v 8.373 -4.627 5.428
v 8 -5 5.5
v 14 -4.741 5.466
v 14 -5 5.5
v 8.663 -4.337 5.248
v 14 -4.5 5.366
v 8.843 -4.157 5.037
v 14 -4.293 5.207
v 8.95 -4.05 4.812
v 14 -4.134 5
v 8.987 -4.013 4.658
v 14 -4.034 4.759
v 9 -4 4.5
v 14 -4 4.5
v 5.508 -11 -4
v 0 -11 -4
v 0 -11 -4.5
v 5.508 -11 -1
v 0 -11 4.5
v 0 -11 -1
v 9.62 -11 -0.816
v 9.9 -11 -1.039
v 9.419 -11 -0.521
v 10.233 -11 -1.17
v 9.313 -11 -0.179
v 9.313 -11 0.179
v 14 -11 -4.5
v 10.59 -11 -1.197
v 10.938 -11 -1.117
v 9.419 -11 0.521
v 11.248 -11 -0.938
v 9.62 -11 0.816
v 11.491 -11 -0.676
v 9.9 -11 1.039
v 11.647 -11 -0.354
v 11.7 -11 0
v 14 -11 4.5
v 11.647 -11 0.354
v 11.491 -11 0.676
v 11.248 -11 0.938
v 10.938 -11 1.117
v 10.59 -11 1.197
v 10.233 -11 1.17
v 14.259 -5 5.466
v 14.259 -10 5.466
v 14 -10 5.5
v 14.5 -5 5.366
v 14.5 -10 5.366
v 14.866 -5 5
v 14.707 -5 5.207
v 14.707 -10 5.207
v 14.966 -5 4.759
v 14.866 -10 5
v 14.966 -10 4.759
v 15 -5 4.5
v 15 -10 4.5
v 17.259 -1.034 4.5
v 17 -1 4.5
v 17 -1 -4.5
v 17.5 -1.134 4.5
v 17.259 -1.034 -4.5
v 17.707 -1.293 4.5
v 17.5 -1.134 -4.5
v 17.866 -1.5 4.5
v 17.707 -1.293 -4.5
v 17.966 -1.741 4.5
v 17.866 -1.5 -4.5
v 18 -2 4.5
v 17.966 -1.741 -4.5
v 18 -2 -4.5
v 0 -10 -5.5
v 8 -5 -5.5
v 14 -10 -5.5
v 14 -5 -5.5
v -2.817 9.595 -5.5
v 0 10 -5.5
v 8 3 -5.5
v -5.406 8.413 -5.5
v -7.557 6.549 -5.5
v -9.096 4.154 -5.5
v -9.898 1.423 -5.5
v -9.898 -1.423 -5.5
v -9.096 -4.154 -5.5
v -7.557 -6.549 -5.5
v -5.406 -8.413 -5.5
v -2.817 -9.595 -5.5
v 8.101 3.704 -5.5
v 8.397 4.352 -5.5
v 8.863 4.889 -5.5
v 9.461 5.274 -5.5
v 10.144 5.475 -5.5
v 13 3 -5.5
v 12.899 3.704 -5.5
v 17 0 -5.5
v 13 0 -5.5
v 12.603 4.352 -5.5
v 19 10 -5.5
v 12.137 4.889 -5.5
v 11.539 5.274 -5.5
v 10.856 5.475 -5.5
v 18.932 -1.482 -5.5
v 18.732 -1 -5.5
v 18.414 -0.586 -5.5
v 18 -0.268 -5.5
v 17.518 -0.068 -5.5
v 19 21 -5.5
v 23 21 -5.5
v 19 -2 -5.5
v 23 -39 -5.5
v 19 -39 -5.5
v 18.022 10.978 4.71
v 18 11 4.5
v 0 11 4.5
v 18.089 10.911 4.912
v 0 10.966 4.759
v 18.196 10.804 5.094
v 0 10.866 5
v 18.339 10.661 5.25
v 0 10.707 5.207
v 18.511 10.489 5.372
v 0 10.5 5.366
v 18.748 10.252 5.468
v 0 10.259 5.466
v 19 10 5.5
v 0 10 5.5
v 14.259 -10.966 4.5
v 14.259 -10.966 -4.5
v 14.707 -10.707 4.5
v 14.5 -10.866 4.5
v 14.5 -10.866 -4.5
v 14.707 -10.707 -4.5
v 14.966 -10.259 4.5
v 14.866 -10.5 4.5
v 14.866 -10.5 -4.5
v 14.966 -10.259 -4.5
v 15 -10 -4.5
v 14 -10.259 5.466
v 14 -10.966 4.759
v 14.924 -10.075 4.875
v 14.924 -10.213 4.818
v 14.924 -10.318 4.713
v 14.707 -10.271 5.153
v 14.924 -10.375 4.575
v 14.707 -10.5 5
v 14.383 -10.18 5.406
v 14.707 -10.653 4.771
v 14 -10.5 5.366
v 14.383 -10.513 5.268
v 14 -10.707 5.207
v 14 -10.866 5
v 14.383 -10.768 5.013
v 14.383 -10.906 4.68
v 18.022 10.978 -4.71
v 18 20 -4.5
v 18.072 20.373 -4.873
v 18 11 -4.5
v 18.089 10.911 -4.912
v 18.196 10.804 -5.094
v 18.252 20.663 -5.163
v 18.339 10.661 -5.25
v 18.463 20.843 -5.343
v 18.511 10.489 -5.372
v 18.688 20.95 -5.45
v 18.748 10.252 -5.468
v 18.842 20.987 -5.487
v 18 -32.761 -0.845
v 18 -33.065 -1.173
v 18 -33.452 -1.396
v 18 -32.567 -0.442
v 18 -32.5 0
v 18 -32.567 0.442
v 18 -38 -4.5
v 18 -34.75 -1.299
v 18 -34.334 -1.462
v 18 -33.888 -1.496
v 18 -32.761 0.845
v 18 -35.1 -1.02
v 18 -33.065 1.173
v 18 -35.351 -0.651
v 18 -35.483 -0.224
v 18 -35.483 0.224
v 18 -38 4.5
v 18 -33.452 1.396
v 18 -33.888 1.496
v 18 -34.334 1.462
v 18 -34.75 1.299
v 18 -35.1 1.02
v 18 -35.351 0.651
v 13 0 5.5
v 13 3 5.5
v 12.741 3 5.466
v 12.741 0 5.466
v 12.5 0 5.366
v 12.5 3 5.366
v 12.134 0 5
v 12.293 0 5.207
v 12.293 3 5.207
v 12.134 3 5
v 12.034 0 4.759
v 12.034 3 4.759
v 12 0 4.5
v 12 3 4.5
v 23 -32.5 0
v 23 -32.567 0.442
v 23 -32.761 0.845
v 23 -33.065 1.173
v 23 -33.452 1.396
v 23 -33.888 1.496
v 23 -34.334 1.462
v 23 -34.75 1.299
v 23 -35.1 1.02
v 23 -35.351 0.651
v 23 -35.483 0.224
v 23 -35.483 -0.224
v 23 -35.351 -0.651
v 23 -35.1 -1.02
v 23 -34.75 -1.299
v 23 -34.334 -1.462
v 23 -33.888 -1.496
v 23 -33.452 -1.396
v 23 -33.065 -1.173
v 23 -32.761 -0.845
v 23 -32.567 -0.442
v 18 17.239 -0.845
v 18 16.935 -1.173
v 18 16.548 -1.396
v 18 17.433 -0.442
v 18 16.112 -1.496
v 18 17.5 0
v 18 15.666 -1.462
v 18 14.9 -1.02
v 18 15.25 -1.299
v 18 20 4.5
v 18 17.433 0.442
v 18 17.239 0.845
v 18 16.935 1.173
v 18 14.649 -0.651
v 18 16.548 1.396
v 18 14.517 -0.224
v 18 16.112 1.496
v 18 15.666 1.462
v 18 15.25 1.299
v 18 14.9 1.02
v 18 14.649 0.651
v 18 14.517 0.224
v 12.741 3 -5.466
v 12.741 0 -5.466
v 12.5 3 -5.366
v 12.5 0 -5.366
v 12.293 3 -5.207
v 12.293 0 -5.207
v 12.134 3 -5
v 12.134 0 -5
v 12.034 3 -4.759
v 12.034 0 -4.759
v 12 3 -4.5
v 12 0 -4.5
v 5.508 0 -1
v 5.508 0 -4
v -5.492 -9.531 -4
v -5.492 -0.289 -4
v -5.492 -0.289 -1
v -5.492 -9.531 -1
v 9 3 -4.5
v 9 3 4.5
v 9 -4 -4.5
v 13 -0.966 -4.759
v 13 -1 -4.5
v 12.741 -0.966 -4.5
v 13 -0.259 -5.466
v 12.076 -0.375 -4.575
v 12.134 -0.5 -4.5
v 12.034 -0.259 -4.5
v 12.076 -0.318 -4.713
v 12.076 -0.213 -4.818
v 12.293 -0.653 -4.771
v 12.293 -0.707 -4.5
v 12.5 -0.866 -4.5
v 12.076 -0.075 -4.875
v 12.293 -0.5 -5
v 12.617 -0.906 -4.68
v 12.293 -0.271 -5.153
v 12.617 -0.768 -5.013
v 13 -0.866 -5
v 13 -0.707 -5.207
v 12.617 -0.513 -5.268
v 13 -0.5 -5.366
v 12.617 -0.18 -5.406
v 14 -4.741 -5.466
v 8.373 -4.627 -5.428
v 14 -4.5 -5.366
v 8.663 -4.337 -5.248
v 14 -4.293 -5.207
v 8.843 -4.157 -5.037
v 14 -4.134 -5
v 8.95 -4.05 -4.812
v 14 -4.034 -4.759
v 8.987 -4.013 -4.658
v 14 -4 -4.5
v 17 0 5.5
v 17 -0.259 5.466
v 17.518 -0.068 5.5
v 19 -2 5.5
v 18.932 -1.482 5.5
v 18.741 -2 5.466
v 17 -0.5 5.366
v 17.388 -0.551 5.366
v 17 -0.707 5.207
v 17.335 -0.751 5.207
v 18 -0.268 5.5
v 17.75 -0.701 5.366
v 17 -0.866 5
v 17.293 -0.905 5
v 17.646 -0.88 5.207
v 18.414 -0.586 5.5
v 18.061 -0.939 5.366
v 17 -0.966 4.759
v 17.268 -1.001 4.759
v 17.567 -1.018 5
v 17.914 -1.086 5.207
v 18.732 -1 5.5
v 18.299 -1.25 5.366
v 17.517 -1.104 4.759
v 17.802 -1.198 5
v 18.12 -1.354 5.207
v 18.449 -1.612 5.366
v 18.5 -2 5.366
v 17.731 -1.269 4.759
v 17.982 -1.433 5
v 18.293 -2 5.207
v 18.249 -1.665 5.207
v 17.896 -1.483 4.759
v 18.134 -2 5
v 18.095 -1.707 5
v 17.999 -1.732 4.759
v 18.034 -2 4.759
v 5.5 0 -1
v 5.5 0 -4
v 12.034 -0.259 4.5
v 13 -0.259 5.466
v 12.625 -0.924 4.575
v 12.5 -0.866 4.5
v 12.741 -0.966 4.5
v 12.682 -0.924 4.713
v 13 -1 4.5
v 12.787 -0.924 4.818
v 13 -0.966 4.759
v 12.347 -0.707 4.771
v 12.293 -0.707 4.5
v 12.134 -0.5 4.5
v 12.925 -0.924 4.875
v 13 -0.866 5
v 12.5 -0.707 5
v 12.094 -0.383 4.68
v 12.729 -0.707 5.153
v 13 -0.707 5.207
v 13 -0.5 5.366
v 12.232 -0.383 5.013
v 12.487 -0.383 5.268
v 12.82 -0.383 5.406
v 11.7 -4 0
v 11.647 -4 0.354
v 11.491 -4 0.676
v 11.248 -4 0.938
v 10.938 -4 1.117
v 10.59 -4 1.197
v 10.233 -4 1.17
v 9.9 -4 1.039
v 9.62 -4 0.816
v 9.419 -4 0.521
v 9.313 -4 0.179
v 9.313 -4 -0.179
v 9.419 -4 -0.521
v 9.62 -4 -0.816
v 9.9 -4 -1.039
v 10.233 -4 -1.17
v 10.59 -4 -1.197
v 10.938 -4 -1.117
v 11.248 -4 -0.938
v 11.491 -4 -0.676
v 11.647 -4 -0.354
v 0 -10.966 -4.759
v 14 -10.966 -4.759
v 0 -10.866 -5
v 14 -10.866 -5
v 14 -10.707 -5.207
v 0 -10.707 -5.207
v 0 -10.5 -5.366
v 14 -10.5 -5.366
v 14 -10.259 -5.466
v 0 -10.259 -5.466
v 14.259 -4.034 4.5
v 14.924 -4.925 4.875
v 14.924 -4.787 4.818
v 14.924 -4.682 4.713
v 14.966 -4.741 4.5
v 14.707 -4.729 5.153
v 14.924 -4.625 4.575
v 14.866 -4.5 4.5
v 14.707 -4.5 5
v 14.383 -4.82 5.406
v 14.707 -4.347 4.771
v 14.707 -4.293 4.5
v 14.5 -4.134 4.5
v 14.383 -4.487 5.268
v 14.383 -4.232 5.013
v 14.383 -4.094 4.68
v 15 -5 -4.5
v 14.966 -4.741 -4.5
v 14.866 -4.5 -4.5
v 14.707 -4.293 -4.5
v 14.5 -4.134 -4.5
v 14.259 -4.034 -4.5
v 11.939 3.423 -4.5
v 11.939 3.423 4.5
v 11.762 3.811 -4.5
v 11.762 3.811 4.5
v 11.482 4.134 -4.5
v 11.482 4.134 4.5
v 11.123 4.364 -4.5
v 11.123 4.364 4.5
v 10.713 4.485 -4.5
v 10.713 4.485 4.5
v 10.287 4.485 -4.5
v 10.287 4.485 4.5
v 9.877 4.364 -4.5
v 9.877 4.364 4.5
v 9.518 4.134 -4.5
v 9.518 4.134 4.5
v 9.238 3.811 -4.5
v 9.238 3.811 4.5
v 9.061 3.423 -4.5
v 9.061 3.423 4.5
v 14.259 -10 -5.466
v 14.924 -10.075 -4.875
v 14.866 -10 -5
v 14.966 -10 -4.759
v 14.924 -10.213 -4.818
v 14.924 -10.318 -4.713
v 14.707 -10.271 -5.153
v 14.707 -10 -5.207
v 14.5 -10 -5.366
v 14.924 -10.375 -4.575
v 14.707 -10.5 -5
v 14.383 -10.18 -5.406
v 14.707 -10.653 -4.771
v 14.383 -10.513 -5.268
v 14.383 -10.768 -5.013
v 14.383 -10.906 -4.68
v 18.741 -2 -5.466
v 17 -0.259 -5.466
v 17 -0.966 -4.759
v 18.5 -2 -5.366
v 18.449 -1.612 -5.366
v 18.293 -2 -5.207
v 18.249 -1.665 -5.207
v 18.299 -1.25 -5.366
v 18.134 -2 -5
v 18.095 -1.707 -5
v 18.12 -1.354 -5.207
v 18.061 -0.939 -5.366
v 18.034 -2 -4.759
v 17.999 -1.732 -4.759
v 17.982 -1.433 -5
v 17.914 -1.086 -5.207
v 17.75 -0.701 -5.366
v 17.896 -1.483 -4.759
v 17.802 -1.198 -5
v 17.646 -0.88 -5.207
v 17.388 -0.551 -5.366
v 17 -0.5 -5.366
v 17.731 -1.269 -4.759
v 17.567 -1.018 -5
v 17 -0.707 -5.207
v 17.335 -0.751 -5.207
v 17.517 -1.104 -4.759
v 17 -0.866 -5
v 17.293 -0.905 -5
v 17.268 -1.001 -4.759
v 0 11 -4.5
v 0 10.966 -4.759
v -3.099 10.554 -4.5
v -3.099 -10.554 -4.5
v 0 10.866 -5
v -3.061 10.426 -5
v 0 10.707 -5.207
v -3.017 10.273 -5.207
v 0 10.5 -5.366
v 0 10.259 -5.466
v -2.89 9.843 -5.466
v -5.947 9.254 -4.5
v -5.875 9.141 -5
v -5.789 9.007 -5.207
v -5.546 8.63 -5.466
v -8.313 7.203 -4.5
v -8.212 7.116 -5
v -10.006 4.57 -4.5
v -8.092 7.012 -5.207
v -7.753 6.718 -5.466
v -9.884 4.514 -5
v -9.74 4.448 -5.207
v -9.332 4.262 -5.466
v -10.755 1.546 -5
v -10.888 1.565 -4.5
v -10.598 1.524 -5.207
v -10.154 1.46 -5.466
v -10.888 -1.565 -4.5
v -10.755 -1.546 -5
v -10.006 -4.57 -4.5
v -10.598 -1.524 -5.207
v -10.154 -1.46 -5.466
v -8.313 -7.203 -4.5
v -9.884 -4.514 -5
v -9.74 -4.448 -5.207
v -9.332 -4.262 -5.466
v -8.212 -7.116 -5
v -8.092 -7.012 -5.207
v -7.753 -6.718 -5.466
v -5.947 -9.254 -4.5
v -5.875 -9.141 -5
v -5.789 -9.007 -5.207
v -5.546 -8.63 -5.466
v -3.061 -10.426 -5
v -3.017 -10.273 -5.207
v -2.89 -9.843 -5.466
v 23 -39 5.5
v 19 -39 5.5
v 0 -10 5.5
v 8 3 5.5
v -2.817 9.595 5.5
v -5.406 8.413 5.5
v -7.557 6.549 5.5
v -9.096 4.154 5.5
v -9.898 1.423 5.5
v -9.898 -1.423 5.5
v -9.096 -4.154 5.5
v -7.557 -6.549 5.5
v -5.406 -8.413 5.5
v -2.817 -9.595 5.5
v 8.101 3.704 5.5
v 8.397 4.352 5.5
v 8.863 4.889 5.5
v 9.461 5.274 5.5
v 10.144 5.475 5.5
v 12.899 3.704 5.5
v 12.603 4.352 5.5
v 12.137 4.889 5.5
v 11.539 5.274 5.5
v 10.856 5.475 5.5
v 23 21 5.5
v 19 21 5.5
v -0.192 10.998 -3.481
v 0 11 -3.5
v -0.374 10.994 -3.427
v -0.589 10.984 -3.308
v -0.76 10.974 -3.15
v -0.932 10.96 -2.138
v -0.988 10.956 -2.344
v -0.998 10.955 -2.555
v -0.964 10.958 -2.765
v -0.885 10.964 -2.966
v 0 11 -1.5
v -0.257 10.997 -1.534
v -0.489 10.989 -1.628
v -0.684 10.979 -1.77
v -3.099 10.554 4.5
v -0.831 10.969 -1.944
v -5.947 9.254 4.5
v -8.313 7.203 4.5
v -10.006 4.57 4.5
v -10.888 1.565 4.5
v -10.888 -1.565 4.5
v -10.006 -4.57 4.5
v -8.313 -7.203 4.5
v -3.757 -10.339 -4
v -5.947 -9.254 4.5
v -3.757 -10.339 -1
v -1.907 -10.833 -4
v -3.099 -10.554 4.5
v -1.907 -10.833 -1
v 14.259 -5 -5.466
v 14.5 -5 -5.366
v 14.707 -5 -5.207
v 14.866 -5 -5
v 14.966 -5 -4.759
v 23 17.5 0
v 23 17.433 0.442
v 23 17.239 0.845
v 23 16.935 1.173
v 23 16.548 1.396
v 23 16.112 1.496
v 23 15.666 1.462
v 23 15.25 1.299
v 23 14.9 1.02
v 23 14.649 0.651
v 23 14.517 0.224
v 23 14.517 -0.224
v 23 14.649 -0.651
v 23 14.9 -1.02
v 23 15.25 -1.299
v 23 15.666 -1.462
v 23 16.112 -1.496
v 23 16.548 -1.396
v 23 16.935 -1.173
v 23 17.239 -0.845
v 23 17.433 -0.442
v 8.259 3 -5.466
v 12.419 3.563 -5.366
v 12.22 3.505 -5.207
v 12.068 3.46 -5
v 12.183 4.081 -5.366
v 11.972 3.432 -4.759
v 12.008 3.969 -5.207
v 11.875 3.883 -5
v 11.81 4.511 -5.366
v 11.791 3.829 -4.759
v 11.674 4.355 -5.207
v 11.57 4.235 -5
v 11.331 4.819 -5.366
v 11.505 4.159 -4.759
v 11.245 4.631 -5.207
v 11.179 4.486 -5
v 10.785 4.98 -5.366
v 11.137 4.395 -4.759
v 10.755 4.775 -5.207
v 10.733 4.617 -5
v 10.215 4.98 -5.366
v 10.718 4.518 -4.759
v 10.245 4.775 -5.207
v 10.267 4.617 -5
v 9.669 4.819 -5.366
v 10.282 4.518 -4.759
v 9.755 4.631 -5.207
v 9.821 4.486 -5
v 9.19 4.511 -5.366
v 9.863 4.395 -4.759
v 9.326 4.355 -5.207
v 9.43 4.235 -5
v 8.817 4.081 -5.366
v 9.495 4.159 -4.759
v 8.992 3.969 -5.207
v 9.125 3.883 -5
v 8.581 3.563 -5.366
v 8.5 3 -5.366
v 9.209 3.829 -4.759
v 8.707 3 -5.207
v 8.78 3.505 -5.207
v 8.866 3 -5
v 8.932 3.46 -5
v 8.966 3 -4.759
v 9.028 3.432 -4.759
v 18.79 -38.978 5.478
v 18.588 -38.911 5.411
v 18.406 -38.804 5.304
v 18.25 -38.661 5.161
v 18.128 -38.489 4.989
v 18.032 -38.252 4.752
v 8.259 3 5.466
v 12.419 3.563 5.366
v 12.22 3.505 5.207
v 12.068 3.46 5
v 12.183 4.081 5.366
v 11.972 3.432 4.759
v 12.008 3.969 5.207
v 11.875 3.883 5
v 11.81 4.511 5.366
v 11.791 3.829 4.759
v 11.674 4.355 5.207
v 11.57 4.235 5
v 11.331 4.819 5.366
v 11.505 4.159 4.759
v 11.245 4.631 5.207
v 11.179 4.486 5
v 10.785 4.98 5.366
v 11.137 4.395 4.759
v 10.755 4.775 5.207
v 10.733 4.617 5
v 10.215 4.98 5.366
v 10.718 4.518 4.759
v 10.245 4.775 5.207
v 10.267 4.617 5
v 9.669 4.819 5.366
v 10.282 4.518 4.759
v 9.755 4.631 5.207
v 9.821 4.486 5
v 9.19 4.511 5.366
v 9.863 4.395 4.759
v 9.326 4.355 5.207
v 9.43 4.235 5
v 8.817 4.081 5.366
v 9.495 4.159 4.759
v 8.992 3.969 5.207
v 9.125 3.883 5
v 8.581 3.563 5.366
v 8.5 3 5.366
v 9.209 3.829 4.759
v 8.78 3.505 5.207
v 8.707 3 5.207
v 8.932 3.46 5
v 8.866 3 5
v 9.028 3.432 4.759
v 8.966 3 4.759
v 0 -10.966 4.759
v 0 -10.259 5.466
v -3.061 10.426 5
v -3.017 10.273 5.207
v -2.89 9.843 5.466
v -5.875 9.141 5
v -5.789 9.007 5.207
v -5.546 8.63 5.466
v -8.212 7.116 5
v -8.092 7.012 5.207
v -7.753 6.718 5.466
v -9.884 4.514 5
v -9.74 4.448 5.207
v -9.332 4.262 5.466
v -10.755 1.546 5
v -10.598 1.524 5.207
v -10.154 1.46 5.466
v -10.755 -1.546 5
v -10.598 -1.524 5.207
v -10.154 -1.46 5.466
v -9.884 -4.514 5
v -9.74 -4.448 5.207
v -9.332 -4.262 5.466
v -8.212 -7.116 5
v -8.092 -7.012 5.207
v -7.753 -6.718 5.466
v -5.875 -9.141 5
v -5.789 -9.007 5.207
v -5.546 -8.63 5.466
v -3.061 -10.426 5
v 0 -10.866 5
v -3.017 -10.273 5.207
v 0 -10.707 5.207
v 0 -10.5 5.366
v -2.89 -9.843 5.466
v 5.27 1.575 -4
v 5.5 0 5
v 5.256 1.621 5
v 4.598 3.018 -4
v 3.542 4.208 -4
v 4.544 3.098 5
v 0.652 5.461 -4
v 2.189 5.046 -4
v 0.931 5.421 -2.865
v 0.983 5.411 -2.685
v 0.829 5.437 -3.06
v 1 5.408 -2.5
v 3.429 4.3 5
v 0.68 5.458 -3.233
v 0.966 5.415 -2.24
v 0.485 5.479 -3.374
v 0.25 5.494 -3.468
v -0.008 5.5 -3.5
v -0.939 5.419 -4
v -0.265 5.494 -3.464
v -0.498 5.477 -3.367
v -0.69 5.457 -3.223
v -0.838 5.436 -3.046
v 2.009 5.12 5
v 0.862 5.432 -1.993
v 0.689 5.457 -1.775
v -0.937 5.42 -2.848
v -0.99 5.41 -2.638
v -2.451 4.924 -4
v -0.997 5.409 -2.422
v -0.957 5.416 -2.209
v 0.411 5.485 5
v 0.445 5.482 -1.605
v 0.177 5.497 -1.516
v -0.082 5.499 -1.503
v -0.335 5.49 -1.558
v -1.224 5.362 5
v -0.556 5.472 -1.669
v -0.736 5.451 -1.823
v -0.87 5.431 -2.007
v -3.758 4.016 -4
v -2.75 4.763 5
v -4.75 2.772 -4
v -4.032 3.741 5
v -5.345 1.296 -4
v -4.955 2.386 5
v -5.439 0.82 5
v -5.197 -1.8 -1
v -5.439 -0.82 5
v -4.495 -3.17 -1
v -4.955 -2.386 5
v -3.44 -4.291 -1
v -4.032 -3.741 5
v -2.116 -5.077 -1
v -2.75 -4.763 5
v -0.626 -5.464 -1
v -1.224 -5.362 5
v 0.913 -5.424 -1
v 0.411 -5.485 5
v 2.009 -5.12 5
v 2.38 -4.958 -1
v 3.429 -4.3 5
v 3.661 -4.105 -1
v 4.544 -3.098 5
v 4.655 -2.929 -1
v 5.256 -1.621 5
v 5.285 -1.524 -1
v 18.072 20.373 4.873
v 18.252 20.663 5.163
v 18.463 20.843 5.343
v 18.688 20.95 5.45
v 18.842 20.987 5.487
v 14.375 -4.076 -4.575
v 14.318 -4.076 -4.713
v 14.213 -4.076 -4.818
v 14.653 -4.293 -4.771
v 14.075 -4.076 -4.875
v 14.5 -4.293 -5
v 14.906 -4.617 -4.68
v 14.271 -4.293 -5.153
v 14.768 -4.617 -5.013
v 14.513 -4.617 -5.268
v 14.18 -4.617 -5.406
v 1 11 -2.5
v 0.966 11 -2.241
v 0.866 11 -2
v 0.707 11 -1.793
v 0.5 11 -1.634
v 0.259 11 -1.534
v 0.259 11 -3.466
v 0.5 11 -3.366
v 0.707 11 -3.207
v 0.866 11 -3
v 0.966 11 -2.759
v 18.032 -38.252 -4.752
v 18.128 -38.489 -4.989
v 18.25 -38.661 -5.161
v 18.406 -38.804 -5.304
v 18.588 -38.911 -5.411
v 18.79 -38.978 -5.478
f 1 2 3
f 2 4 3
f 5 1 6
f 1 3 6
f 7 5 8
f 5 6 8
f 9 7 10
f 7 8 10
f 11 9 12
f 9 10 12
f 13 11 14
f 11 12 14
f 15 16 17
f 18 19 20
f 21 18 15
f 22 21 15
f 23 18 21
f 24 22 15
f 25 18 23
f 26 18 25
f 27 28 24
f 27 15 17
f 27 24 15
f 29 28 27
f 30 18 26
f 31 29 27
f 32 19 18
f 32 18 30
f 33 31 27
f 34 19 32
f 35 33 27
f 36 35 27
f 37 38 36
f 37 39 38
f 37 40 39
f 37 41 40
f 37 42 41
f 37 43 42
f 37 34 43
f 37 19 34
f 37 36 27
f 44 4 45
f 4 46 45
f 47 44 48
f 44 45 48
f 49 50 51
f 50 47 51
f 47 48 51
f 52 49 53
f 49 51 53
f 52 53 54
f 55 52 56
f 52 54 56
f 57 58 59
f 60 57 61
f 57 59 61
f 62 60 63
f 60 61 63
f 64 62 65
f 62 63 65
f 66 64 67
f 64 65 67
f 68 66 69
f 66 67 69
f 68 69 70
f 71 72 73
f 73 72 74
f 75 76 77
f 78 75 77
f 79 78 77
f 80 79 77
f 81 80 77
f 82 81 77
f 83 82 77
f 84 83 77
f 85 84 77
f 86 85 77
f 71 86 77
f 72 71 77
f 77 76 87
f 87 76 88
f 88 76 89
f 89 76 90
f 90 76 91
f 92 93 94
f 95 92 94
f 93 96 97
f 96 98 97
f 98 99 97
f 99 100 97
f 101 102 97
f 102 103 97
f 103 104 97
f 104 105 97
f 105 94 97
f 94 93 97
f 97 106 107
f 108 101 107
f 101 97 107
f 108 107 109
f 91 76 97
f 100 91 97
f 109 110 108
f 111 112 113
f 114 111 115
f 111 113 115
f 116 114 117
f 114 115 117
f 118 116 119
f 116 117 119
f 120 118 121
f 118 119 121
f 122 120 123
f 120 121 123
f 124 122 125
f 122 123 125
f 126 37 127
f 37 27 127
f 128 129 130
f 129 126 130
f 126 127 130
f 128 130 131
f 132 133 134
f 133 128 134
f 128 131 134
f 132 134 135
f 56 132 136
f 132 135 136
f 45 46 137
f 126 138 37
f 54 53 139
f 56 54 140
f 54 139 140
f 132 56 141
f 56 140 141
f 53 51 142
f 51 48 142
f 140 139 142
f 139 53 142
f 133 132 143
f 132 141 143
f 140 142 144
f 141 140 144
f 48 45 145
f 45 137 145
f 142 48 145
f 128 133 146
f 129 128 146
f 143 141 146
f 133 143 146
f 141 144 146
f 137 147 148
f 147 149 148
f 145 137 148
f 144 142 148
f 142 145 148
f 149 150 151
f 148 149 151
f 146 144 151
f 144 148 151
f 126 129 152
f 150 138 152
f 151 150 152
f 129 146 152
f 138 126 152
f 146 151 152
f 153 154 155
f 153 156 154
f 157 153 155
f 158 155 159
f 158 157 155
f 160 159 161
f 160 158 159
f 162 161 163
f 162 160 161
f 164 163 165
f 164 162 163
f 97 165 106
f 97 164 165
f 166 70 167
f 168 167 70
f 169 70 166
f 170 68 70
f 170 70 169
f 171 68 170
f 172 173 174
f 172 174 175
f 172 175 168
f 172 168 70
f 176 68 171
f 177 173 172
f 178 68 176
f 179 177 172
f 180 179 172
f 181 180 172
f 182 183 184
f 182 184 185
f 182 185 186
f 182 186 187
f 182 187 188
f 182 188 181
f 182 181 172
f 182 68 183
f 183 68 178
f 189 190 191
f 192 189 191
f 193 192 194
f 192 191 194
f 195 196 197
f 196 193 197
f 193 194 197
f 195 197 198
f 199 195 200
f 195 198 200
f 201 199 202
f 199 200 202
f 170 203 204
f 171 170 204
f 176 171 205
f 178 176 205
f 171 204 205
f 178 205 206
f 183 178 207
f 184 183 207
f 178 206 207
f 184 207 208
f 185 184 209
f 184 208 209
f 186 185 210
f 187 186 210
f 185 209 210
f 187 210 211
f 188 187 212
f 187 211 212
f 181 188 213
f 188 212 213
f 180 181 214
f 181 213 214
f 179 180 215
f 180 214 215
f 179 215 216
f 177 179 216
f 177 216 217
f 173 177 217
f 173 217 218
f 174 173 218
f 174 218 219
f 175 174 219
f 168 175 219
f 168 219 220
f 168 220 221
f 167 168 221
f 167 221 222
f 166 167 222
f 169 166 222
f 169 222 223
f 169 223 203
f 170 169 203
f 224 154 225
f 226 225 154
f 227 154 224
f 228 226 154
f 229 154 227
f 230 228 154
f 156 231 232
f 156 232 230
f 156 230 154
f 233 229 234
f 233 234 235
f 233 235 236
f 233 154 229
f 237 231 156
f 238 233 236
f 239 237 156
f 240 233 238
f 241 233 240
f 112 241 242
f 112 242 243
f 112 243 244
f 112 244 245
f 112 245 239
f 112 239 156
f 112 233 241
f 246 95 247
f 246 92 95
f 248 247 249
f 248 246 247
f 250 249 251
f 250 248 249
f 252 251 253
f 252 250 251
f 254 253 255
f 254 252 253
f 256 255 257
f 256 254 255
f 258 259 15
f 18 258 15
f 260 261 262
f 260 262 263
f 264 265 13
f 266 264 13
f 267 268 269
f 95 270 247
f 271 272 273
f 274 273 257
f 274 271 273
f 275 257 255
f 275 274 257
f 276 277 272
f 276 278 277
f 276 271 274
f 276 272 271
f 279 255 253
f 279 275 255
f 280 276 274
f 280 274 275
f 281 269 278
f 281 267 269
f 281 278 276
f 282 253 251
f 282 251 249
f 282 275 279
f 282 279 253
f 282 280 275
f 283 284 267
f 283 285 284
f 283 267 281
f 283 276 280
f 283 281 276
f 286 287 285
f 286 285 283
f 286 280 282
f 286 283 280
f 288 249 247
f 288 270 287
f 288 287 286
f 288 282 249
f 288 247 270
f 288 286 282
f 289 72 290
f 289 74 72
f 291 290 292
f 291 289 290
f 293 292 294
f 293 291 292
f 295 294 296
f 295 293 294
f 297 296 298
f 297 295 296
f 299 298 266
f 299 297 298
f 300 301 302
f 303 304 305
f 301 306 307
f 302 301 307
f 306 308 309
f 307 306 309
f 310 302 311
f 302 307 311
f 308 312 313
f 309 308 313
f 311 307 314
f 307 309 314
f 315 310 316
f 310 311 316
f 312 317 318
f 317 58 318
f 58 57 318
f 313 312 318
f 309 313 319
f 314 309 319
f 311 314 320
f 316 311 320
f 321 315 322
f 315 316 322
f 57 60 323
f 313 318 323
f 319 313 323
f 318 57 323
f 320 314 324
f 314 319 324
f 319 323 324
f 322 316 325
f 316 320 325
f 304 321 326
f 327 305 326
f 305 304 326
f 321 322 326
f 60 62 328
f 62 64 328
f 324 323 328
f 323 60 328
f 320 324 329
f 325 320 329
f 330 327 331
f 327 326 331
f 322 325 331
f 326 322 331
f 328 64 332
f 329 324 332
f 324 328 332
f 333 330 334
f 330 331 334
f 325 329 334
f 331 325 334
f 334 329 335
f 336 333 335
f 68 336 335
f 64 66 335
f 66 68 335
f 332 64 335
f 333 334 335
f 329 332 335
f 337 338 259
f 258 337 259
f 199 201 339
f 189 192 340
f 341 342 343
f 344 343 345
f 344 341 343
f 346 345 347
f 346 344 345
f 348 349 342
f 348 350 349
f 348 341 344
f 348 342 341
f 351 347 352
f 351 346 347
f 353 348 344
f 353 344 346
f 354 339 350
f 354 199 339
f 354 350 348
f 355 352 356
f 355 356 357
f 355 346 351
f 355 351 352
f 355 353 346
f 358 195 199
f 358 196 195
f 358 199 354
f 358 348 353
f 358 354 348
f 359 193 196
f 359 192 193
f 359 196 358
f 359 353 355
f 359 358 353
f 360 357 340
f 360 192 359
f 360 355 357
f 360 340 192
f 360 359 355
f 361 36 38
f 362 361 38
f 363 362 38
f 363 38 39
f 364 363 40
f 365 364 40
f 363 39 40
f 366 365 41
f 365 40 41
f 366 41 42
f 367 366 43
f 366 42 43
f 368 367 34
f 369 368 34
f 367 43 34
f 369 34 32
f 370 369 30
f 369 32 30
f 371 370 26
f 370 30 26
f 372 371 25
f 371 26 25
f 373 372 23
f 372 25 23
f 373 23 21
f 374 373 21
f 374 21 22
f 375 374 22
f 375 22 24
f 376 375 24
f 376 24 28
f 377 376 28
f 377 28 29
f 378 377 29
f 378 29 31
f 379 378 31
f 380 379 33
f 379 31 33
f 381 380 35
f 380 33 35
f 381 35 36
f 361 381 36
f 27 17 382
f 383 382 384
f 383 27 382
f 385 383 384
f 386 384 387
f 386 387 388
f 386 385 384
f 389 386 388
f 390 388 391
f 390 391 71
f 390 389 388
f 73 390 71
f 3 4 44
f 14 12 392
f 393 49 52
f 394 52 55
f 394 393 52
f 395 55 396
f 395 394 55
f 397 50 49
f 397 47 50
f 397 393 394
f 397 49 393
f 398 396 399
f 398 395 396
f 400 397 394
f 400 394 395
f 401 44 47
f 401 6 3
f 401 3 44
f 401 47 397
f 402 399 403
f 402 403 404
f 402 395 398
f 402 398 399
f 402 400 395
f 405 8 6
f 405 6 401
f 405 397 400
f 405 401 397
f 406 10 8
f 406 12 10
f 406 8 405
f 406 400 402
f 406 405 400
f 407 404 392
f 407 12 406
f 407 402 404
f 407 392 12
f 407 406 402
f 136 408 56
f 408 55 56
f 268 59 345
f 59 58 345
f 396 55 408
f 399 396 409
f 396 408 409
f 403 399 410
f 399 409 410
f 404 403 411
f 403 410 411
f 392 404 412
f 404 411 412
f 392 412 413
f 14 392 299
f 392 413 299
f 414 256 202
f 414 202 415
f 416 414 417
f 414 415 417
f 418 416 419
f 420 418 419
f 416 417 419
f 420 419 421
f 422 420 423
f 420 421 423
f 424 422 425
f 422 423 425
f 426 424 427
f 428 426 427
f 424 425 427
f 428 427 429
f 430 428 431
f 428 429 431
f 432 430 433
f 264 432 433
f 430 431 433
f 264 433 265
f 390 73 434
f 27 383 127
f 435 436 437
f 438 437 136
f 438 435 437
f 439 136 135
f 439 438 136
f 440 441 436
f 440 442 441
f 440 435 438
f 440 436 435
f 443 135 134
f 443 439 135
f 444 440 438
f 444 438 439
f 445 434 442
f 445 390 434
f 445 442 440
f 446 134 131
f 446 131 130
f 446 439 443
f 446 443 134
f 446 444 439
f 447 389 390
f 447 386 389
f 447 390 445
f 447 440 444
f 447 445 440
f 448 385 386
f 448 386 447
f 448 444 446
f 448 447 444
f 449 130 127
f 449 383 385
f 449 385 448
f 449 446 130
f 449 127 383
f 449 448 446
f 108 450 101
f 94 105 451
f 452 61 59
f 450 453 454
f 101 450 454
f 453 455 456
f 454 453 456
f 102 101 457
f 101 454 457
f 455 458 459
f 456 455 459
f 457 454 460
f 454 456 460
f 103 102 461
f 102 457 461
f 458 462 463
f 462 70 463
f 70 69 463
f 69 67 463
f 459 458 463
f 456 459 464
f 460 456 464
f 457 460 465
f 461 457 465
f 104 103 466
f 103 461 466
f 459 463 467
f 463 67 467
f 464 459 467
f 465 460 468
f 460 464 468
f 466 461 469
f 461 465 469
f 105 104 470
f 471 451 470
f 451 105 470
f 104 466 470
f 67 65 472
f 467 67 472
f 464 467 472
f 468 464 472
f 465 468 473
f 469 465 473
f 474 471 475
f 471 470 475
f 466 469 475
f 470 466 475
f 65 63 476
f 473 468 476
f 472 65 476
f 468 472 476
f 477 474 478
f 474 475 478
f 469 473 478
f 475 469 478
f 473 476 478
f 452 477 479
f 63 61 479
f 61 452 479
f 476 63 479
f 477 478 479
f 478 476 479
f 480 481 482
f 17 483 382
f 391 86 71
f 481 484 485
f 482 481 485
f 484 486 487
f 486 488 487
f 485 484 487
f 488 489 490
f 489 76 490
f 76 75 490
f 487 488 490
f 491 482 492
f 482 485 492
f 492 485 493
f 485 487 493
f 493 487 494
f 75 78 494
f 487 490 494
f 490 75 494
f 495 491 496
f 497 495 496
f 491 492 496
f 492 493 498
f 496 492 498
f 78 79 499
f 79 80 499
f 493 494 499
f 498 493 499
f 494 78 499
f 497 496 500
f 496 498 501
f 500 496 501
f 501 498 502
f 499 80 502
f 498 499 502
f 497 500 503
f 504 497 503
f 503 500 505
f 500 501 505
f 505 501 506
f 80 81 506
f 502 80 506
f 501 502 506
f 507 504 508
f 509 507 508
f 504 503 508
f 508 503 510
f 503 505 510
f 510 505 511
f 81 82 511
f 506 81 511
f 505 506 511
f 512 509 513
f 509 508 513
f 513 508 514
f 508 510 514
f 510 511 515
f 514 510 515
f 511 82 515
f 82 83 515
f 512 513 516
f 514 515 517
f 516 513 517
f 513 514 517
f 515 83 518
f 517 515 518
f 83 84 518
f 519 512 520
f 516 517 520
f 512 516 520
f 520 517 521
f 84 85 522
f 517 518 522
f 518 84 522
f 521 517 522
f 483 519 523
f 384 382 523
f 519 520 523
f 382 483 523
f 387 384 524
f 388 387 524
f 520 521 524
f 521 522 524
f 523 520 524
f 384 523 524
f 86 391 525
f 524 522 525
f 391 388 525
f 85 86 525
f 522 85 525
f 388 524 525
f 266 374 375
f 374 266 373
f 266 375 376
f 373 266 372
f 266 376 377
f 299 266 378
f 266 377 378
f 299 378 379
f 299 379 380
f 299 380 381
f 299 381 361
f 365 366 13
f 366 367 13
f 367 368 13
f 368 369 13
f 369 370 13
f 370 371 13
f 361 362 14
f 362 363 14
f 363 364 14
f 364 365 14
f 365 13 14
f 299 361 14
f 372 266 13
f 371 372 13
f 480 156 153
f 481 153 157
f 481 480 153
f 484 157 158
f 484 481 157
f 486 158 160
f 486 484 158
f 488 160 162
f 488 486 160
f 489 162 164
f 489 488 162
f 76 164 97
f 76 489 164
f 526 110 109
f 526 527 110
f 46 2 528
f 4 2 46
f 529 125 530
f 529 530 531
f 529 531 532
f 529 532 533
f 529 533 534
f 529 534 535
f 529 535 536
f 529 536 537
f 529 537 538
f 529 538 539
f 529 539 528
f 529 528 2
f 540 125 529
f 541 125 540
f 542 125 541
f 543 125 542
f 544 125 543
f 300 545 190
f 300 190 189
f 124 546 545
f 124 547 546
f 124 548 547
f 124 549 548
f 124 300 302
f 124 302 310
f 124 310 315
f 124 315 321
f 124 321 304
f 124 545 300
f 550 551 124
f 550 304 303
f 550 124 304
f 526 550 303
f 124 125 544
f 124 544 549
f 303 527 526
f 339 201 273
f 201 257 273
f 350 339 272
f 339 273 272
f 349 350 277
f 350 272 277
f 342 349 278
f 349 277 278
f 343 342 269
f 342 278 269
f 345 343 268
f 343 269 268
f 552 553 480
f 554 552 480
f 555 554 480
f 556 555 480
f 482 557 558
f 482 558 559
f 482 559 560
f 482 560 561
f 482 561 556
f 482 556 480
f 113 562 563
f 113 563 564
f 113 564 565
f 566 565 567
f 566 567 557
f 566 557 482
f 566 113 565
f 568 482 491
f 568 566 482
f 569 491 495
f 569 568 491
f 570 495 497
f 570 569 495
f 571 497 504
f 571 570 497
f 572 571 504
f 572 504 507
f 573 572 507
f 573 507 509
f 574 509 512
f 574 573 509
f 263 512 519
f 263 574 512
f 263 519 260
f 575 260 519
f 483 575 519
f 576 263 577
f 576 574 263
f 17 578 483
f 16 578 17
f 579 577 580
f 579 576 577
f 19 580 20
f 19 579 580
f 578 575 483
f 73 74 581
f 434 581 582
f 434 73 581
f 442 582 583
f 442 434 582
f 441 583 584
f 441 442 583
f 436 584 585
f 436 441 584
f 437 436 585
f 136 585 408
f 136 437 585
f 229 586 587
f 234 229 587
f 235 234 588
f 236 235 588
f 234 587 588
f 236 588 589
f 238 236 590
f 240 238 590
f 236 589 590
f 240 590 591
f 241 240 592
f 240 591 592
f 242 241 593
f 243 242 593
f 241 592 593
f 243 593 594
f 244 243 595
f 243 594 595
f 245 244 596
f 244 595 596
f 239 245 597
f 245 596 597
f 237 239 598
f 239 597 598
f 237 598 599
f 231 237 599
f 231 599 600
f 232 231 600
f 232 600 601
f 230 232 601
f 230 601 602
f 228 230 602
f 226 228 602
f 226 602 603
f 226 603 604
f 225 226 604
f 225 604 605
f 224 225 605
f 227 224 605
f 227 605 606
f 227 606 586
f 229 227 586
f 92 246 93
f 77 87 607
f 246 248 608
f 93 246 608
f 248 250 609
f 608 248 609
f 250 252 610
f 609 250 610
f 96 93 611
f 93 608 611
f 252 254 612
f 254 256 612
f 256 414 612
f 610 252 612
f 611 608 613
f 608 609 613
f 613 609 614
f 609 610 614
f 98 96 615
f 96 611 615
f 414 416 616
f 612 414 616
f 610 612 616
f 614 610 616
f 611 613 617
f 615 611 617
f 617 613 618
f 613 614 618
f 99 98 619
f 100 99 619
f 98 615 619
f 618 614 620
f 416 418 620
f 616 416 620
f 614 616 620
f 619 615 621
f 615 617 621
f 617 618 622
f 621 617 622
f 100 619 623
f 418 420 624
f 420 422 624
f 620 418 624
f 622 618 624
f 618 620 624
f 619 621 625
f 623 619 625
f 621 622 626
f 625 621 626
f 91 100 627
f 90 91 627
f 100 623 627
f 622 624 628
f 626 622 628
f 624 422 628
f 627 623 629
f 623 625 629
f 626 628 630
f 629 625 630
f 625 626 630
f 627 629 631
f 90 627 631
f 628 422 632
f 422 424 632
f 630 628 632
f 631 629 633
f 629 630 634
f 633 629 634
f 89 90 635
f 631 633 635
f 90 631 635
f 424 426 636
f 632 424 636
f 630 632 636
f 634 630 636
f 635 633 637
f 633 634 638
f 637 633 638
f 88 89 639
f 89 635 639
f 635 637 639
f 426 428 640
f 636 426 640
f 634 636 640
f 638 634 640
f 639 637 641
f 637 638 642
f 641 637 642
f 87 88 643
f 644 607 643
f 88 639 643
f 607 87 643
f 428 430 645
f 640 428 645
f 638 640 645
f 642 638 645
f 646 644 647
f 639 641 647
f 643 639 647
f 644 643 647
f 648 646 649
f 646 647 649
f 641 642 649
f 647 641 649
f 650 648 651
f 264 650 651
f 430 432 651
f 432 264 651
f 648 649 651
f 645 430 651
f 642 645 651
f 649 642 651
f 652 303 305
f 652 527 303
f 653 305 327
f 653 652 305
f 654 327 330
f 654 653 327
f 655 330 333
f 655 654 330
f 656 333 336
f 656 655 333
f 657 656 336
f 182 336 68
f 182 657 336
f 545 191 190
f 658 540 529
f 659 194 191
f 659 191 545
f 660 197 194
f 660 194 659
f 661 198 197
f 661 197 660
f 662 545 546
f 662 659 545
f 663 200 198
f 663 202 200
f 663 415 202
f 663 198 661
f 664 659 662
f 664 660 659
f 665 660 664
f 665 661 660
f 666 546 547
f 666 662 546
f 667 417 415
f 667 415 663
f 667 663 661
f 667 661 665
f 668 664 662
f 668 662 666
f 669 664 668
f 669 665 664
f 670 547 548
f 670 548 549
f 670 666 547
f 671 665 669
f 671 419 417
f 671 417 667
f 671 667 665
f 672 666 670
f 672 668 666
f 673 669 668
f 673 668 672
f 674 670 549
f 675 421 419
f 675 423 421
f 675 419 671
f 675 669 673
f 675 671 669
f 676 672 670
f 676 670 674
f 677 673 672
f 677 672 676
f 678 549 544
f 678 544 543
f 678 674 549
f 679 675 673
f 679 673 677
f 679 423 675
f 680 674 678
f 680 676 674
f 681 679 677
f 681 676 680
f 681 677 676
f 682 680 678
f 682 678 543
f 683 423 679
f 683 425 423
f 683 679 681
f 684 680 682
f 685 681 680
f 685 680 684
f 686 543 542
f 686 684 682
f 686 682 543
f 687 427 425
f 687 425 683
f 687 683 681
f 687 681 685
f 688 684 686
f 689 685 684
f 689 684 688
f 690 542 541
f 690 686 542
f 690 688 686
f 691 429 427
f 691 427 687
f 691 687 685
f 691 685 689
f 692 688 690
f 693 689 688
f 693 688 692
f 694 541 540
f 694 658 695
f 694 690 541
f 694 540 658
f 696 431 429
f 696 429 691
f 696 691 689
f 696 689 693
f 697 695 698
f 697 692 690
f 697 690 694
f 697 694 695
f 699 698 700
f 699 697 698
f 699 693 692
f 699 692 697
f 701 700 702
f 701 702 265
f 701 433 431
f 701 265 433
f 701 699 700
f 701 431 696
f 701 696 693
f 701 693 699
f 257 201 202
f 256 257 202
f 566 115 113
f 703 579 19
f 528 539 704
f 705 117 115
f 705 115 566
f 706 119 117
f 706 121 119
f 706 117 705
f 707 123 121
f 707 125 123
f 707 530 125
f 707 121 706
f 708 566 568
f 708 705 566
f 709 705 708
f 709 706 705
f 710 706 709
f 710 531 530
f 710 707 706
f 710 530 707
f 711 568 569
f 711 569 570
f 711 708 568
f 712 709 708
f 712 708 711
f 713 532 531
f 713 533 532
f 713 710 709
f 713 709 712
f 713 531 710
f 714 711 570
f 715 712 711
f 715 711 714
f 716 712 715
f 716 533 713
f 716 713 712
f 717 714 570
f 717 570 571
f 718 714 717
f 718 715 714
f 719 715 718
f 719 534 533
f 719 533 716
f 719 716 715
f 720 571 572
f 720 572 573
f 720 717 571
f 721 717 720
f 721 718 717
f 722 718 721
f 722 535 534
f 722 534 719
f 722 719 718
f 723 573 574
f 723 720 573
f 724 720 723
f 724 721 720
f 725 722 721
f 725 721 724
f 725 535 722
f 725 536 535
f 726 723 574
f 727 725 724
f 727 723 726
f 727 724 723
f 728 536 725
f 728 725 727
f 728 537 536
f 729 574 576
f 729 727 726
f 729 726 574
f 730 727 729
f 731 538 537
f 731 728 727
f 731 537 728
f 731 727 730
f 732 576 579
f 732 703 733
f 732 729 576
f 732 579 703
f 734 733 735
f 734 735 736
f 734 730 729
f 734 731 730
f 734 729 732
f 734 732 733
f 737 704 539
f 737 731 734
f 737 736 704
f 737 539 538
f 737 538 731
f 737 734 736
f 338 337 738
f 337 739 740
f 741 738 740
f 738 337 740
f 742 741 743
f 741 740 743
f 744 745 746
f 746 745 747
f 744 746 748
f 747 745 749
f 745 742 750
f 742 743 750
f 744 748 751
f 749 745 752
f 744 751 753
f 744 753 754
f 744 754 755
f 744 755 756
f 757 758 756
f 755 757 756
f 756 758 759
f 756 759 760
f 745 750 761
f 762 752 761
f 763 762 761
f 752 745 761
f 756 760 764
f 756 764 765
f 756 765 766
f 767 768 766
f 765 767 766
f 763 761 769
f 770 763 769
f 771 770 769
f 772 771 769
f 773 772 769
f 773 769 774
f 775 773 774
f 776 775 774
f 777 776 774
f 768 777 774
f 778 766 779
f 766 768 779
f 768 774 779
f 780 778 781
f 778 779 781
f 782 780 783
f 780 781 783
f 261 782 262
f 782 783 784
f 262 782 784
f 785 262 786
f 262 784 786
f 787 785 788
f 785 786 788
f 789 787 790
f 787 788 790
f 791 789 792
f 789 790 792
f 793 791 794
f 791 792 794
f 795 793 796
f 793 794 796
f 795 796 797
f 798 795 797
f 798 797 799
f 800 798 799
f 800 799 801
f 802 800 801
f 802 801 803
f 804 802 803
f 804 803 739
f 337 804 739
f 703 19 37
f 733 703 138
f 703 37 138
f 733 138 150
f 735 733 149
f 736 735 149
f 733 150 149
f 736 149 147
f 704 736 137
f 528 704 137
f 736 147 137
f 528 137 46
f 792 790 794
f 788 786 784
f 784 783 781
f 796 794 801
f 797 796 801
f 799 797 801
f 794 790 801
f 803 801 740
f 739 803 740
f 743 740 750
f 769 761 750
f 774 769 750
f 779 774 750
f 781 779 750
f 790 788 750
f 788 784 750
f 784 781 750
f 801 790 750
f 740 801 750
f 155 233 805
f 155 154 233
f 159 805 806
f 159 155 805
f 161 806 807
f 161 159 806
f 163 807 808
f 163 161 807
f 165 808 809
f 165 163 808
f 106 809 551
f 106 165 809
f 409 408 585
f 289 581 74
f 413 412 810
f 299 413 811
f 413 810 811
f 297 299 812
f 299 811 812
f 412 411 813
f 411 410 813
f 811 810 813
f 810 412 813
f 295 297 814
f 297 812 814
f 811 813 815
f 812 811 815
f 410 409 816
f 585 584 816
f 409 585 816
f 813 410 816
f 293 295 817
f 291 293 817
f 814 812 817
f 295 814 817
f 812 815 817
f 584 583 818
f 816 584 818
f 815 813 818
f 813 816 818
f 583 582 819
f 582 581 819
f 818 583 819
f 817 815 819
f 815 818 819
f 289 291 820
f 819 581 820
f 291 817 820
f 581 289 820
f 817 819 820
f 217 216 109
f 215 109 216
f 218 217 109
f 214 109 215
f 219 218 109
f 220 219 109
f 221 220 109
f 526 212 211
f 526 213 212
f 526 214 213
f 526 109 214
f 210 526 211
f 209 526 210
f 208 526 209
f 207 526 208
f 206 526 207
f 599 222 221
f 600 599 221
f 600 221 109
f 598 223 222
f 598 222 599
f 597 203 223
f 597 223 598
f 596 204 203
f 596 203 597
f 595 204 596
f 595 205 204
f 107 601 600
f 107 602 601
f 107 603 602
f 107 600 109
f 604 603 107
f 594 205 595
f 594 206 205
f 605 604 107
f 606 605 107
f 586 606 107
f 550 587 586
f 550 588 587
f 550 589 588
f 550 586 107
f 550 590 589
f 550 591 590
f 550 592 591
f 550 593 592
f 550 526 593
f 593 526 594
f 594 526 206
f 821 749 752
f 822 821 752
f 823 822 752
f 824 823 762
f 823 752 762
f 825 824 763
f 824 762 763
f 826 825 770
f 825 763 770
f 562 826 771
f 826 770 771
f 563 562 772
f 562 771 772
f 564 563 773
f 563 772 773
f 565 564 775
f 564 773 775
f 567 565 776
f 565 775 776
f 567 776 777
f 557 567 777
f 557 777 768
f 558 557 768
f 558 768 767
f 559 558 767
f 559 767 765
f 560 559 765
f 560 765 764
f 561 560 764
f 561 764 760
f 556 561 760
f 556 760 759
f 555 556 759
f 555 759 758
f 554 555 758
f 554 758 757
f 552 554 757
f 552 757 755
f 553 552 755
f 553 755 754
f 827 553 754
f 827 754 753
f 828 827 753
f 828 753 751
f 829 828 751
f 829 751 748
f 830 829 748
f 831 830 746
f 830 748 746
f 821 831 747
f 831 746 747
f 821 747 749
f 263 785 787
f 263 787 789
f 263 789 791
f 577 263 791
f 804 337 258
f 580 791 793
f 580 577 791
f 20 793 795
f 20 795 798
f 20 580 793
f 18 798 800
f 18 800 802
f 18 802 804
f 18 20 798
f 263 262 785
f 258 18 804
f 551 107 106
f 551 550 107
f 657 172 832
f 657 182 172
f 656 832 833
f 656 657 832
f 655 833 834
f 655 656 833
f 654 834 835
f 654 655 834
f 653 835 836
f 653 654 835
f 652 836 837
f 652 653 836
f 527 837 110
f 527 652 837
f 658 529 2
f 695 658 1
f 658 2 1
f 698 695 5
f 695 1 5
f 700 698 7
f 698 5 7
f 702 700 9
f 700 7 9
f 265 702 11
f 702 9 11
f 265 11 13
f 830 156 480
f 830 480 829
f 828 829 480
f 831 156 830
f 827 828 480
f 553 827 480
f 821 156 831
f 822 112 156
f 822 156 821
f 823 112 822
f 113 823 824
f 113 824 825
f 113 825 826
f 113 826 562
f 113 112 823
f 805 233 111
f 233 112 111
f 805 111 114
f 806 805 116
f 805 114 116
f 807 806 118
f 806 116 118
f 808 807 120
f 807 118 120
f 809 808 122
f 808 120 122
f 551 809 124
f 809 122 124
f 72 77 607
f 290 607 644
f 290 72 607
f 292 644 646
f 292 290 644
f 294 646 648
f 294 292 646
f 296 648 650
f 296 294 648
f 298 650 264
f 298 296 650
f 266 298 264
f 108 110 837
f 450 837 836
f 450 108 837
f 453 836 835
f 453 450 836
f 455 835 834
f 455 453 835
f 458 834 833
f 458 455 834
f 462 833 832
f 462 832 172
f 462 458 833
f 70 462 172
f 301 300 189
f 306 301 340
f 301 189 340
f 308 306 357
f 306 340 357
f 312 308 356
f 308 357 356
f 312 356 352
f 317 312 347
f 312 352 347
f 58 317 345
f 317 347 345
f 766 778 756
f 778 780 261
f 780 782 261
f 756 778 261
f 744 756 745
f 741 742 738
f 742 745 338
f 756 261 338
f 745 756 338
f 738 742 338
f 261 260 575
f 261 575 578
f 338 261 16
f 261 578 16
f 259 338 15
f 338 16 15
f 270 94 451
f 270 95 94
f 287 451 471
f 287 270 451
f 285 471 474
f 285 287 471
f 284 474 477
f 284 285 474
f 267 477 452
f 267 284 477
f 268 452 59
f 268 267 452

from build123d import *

# Parameters (mm, degrees)
F1_DEPTH  = 5.5
F2_R      = 1.5
F3_DEPTH  = 25
F5_START  = -0.5
F4_R      = 5.5
F5_DEPTH  = 9
F7_START  = -1.5
F6_W      = 11
F6_H      = 16.464828267
F7_DEPTH  = 3
F8_R      = 1
F9_DEPTH  = 25
F11_DEPTH = 25
F12_R     = 1.2
F13_DEPTH = 7
F14_R     = 1


with BuildPart() as f1:
    # F0 (on Top) → F1 (new body, symmetric)
    with BuildSketch(Plane.XY):
        with BuildLine():
            Line((18, 11), (0, 11))
            ThreePointArc((0, 11), (-11, 0), (0, -11))
            Line((0, -11), (18, -11))
            Line((18, -11), (18, -39))
            Line((18, -39), (23, -39))
            Line((23, -39), (23, 21))
            Line((23, 21), (18, 21))
            Line((18, 21), (18, 11))
        make_face()
    extrude(amount=F1_DEPTH, both=True)

    # F2 (on face) → F3 (cut)
    with BuildSketch(Plane.YZ.offset(23)):
        with Locations((16, 0)):
            Circle(F2_R)
        with Locations((-34, 0)):
            Circle(F2_R)
    extrude(amount=-F3_DEPTH, mode=Mode.SUBTRACT)

    # F4 (on face) → F5 (cut)
    with BuildSketch(Plane.XY.offset(5.5).offset(F5_START)):
        Circle(F4_R)
    extrude(amount=-F5_DEPTH, mode=Mode.SUBTRACT)

    # F6 (on face) → F7 (cut)
    with BuildSketch(Plane(origin=(0, 0, -5.5), x_dir=(1, 0, 0), z_dir=(0, 0, -1)).offset(F7_START)):
        with Locations((0.0076012546, 8.2324141335)):
            Rectangle(F6_W, F6_H)
    extrude(amount=-F7_DEPTH, mode=Mode.SUBTRACT)

    # F8 (on face) → F9 (cut)
    with BuildSketch(Plane.XZ.offset(11)):
        with Locations((0, -2.5)):
            Circle(F8_R)
    extrude(amount=-F9_DEPTH, mode=Mode.SUBTRACT)

    # F10 (on face) → F11 (cut)
    with BuildSketch(Plane.XY.offset(5.5)):
        with BuildLine():
            Line((12, -1), (12, 3))
            ThreePointArc((12, 3), (10.5, 4.5), (9, 3))
            Line((9, 3), (9, -4))
            Line((9, -4), (15, -4))
            Line((15, -4), (15, -11))
            Line((15, -11), (18, -11))
            Line((18, -11), (18, -1))
            Line((18, -1), (12, -1))
        make_face()
    extrude(amount=-F11_DEPTH, mode=Mode.SUBTRACT)

    # F12 (on face) → F13 (cut, through all)
    with BuildSketch(Plane.XZ.offset(11)):
        with Locations((10.5, 0)):
            Circle(F12_R)
    extrude(amount=-F13_DEPTH, mode=Mode.SUBTRACT)

    # F14
    f14_edges = [f1.edges().sort_by_distance(p)[0] for p in [
        (18, 16, 5.5),
        (18, 21, 0),
        (18, 16, -5.5),
        (9, 11, 5.5),
        (18, -20, 5.5),
        (-11, 0, -5.5),
        (7.5, -11, -5.5),
        (18, -20, -5.5),
        (15, -1, -5.5),
        (18, -39, 0),
        (18, -1, 0),
        (12, 1, 5.5),
        (12, -4, 5.5),
        (15, -7.5, -5.5),
        (15, -7.5, 5.5),
        (15, -11, 0),
        (15, -4, 0),
        (12, -1, 0),
        (9, -0.5, -5.5),
        (12, -4, -5.5),
        (9, 11, -5.5),
        (-11, 0, 5.5),
        (7.5, -11, 5.5),
        (9, -0.5, 5.5),
        (10.5, 4.5, 5.5),
        (15, -1, 5.5),
        (10.5, 4.5, -5.5),
    ]]
    fillet(f14_edges, radius=F14_R)


solid = f1.part
